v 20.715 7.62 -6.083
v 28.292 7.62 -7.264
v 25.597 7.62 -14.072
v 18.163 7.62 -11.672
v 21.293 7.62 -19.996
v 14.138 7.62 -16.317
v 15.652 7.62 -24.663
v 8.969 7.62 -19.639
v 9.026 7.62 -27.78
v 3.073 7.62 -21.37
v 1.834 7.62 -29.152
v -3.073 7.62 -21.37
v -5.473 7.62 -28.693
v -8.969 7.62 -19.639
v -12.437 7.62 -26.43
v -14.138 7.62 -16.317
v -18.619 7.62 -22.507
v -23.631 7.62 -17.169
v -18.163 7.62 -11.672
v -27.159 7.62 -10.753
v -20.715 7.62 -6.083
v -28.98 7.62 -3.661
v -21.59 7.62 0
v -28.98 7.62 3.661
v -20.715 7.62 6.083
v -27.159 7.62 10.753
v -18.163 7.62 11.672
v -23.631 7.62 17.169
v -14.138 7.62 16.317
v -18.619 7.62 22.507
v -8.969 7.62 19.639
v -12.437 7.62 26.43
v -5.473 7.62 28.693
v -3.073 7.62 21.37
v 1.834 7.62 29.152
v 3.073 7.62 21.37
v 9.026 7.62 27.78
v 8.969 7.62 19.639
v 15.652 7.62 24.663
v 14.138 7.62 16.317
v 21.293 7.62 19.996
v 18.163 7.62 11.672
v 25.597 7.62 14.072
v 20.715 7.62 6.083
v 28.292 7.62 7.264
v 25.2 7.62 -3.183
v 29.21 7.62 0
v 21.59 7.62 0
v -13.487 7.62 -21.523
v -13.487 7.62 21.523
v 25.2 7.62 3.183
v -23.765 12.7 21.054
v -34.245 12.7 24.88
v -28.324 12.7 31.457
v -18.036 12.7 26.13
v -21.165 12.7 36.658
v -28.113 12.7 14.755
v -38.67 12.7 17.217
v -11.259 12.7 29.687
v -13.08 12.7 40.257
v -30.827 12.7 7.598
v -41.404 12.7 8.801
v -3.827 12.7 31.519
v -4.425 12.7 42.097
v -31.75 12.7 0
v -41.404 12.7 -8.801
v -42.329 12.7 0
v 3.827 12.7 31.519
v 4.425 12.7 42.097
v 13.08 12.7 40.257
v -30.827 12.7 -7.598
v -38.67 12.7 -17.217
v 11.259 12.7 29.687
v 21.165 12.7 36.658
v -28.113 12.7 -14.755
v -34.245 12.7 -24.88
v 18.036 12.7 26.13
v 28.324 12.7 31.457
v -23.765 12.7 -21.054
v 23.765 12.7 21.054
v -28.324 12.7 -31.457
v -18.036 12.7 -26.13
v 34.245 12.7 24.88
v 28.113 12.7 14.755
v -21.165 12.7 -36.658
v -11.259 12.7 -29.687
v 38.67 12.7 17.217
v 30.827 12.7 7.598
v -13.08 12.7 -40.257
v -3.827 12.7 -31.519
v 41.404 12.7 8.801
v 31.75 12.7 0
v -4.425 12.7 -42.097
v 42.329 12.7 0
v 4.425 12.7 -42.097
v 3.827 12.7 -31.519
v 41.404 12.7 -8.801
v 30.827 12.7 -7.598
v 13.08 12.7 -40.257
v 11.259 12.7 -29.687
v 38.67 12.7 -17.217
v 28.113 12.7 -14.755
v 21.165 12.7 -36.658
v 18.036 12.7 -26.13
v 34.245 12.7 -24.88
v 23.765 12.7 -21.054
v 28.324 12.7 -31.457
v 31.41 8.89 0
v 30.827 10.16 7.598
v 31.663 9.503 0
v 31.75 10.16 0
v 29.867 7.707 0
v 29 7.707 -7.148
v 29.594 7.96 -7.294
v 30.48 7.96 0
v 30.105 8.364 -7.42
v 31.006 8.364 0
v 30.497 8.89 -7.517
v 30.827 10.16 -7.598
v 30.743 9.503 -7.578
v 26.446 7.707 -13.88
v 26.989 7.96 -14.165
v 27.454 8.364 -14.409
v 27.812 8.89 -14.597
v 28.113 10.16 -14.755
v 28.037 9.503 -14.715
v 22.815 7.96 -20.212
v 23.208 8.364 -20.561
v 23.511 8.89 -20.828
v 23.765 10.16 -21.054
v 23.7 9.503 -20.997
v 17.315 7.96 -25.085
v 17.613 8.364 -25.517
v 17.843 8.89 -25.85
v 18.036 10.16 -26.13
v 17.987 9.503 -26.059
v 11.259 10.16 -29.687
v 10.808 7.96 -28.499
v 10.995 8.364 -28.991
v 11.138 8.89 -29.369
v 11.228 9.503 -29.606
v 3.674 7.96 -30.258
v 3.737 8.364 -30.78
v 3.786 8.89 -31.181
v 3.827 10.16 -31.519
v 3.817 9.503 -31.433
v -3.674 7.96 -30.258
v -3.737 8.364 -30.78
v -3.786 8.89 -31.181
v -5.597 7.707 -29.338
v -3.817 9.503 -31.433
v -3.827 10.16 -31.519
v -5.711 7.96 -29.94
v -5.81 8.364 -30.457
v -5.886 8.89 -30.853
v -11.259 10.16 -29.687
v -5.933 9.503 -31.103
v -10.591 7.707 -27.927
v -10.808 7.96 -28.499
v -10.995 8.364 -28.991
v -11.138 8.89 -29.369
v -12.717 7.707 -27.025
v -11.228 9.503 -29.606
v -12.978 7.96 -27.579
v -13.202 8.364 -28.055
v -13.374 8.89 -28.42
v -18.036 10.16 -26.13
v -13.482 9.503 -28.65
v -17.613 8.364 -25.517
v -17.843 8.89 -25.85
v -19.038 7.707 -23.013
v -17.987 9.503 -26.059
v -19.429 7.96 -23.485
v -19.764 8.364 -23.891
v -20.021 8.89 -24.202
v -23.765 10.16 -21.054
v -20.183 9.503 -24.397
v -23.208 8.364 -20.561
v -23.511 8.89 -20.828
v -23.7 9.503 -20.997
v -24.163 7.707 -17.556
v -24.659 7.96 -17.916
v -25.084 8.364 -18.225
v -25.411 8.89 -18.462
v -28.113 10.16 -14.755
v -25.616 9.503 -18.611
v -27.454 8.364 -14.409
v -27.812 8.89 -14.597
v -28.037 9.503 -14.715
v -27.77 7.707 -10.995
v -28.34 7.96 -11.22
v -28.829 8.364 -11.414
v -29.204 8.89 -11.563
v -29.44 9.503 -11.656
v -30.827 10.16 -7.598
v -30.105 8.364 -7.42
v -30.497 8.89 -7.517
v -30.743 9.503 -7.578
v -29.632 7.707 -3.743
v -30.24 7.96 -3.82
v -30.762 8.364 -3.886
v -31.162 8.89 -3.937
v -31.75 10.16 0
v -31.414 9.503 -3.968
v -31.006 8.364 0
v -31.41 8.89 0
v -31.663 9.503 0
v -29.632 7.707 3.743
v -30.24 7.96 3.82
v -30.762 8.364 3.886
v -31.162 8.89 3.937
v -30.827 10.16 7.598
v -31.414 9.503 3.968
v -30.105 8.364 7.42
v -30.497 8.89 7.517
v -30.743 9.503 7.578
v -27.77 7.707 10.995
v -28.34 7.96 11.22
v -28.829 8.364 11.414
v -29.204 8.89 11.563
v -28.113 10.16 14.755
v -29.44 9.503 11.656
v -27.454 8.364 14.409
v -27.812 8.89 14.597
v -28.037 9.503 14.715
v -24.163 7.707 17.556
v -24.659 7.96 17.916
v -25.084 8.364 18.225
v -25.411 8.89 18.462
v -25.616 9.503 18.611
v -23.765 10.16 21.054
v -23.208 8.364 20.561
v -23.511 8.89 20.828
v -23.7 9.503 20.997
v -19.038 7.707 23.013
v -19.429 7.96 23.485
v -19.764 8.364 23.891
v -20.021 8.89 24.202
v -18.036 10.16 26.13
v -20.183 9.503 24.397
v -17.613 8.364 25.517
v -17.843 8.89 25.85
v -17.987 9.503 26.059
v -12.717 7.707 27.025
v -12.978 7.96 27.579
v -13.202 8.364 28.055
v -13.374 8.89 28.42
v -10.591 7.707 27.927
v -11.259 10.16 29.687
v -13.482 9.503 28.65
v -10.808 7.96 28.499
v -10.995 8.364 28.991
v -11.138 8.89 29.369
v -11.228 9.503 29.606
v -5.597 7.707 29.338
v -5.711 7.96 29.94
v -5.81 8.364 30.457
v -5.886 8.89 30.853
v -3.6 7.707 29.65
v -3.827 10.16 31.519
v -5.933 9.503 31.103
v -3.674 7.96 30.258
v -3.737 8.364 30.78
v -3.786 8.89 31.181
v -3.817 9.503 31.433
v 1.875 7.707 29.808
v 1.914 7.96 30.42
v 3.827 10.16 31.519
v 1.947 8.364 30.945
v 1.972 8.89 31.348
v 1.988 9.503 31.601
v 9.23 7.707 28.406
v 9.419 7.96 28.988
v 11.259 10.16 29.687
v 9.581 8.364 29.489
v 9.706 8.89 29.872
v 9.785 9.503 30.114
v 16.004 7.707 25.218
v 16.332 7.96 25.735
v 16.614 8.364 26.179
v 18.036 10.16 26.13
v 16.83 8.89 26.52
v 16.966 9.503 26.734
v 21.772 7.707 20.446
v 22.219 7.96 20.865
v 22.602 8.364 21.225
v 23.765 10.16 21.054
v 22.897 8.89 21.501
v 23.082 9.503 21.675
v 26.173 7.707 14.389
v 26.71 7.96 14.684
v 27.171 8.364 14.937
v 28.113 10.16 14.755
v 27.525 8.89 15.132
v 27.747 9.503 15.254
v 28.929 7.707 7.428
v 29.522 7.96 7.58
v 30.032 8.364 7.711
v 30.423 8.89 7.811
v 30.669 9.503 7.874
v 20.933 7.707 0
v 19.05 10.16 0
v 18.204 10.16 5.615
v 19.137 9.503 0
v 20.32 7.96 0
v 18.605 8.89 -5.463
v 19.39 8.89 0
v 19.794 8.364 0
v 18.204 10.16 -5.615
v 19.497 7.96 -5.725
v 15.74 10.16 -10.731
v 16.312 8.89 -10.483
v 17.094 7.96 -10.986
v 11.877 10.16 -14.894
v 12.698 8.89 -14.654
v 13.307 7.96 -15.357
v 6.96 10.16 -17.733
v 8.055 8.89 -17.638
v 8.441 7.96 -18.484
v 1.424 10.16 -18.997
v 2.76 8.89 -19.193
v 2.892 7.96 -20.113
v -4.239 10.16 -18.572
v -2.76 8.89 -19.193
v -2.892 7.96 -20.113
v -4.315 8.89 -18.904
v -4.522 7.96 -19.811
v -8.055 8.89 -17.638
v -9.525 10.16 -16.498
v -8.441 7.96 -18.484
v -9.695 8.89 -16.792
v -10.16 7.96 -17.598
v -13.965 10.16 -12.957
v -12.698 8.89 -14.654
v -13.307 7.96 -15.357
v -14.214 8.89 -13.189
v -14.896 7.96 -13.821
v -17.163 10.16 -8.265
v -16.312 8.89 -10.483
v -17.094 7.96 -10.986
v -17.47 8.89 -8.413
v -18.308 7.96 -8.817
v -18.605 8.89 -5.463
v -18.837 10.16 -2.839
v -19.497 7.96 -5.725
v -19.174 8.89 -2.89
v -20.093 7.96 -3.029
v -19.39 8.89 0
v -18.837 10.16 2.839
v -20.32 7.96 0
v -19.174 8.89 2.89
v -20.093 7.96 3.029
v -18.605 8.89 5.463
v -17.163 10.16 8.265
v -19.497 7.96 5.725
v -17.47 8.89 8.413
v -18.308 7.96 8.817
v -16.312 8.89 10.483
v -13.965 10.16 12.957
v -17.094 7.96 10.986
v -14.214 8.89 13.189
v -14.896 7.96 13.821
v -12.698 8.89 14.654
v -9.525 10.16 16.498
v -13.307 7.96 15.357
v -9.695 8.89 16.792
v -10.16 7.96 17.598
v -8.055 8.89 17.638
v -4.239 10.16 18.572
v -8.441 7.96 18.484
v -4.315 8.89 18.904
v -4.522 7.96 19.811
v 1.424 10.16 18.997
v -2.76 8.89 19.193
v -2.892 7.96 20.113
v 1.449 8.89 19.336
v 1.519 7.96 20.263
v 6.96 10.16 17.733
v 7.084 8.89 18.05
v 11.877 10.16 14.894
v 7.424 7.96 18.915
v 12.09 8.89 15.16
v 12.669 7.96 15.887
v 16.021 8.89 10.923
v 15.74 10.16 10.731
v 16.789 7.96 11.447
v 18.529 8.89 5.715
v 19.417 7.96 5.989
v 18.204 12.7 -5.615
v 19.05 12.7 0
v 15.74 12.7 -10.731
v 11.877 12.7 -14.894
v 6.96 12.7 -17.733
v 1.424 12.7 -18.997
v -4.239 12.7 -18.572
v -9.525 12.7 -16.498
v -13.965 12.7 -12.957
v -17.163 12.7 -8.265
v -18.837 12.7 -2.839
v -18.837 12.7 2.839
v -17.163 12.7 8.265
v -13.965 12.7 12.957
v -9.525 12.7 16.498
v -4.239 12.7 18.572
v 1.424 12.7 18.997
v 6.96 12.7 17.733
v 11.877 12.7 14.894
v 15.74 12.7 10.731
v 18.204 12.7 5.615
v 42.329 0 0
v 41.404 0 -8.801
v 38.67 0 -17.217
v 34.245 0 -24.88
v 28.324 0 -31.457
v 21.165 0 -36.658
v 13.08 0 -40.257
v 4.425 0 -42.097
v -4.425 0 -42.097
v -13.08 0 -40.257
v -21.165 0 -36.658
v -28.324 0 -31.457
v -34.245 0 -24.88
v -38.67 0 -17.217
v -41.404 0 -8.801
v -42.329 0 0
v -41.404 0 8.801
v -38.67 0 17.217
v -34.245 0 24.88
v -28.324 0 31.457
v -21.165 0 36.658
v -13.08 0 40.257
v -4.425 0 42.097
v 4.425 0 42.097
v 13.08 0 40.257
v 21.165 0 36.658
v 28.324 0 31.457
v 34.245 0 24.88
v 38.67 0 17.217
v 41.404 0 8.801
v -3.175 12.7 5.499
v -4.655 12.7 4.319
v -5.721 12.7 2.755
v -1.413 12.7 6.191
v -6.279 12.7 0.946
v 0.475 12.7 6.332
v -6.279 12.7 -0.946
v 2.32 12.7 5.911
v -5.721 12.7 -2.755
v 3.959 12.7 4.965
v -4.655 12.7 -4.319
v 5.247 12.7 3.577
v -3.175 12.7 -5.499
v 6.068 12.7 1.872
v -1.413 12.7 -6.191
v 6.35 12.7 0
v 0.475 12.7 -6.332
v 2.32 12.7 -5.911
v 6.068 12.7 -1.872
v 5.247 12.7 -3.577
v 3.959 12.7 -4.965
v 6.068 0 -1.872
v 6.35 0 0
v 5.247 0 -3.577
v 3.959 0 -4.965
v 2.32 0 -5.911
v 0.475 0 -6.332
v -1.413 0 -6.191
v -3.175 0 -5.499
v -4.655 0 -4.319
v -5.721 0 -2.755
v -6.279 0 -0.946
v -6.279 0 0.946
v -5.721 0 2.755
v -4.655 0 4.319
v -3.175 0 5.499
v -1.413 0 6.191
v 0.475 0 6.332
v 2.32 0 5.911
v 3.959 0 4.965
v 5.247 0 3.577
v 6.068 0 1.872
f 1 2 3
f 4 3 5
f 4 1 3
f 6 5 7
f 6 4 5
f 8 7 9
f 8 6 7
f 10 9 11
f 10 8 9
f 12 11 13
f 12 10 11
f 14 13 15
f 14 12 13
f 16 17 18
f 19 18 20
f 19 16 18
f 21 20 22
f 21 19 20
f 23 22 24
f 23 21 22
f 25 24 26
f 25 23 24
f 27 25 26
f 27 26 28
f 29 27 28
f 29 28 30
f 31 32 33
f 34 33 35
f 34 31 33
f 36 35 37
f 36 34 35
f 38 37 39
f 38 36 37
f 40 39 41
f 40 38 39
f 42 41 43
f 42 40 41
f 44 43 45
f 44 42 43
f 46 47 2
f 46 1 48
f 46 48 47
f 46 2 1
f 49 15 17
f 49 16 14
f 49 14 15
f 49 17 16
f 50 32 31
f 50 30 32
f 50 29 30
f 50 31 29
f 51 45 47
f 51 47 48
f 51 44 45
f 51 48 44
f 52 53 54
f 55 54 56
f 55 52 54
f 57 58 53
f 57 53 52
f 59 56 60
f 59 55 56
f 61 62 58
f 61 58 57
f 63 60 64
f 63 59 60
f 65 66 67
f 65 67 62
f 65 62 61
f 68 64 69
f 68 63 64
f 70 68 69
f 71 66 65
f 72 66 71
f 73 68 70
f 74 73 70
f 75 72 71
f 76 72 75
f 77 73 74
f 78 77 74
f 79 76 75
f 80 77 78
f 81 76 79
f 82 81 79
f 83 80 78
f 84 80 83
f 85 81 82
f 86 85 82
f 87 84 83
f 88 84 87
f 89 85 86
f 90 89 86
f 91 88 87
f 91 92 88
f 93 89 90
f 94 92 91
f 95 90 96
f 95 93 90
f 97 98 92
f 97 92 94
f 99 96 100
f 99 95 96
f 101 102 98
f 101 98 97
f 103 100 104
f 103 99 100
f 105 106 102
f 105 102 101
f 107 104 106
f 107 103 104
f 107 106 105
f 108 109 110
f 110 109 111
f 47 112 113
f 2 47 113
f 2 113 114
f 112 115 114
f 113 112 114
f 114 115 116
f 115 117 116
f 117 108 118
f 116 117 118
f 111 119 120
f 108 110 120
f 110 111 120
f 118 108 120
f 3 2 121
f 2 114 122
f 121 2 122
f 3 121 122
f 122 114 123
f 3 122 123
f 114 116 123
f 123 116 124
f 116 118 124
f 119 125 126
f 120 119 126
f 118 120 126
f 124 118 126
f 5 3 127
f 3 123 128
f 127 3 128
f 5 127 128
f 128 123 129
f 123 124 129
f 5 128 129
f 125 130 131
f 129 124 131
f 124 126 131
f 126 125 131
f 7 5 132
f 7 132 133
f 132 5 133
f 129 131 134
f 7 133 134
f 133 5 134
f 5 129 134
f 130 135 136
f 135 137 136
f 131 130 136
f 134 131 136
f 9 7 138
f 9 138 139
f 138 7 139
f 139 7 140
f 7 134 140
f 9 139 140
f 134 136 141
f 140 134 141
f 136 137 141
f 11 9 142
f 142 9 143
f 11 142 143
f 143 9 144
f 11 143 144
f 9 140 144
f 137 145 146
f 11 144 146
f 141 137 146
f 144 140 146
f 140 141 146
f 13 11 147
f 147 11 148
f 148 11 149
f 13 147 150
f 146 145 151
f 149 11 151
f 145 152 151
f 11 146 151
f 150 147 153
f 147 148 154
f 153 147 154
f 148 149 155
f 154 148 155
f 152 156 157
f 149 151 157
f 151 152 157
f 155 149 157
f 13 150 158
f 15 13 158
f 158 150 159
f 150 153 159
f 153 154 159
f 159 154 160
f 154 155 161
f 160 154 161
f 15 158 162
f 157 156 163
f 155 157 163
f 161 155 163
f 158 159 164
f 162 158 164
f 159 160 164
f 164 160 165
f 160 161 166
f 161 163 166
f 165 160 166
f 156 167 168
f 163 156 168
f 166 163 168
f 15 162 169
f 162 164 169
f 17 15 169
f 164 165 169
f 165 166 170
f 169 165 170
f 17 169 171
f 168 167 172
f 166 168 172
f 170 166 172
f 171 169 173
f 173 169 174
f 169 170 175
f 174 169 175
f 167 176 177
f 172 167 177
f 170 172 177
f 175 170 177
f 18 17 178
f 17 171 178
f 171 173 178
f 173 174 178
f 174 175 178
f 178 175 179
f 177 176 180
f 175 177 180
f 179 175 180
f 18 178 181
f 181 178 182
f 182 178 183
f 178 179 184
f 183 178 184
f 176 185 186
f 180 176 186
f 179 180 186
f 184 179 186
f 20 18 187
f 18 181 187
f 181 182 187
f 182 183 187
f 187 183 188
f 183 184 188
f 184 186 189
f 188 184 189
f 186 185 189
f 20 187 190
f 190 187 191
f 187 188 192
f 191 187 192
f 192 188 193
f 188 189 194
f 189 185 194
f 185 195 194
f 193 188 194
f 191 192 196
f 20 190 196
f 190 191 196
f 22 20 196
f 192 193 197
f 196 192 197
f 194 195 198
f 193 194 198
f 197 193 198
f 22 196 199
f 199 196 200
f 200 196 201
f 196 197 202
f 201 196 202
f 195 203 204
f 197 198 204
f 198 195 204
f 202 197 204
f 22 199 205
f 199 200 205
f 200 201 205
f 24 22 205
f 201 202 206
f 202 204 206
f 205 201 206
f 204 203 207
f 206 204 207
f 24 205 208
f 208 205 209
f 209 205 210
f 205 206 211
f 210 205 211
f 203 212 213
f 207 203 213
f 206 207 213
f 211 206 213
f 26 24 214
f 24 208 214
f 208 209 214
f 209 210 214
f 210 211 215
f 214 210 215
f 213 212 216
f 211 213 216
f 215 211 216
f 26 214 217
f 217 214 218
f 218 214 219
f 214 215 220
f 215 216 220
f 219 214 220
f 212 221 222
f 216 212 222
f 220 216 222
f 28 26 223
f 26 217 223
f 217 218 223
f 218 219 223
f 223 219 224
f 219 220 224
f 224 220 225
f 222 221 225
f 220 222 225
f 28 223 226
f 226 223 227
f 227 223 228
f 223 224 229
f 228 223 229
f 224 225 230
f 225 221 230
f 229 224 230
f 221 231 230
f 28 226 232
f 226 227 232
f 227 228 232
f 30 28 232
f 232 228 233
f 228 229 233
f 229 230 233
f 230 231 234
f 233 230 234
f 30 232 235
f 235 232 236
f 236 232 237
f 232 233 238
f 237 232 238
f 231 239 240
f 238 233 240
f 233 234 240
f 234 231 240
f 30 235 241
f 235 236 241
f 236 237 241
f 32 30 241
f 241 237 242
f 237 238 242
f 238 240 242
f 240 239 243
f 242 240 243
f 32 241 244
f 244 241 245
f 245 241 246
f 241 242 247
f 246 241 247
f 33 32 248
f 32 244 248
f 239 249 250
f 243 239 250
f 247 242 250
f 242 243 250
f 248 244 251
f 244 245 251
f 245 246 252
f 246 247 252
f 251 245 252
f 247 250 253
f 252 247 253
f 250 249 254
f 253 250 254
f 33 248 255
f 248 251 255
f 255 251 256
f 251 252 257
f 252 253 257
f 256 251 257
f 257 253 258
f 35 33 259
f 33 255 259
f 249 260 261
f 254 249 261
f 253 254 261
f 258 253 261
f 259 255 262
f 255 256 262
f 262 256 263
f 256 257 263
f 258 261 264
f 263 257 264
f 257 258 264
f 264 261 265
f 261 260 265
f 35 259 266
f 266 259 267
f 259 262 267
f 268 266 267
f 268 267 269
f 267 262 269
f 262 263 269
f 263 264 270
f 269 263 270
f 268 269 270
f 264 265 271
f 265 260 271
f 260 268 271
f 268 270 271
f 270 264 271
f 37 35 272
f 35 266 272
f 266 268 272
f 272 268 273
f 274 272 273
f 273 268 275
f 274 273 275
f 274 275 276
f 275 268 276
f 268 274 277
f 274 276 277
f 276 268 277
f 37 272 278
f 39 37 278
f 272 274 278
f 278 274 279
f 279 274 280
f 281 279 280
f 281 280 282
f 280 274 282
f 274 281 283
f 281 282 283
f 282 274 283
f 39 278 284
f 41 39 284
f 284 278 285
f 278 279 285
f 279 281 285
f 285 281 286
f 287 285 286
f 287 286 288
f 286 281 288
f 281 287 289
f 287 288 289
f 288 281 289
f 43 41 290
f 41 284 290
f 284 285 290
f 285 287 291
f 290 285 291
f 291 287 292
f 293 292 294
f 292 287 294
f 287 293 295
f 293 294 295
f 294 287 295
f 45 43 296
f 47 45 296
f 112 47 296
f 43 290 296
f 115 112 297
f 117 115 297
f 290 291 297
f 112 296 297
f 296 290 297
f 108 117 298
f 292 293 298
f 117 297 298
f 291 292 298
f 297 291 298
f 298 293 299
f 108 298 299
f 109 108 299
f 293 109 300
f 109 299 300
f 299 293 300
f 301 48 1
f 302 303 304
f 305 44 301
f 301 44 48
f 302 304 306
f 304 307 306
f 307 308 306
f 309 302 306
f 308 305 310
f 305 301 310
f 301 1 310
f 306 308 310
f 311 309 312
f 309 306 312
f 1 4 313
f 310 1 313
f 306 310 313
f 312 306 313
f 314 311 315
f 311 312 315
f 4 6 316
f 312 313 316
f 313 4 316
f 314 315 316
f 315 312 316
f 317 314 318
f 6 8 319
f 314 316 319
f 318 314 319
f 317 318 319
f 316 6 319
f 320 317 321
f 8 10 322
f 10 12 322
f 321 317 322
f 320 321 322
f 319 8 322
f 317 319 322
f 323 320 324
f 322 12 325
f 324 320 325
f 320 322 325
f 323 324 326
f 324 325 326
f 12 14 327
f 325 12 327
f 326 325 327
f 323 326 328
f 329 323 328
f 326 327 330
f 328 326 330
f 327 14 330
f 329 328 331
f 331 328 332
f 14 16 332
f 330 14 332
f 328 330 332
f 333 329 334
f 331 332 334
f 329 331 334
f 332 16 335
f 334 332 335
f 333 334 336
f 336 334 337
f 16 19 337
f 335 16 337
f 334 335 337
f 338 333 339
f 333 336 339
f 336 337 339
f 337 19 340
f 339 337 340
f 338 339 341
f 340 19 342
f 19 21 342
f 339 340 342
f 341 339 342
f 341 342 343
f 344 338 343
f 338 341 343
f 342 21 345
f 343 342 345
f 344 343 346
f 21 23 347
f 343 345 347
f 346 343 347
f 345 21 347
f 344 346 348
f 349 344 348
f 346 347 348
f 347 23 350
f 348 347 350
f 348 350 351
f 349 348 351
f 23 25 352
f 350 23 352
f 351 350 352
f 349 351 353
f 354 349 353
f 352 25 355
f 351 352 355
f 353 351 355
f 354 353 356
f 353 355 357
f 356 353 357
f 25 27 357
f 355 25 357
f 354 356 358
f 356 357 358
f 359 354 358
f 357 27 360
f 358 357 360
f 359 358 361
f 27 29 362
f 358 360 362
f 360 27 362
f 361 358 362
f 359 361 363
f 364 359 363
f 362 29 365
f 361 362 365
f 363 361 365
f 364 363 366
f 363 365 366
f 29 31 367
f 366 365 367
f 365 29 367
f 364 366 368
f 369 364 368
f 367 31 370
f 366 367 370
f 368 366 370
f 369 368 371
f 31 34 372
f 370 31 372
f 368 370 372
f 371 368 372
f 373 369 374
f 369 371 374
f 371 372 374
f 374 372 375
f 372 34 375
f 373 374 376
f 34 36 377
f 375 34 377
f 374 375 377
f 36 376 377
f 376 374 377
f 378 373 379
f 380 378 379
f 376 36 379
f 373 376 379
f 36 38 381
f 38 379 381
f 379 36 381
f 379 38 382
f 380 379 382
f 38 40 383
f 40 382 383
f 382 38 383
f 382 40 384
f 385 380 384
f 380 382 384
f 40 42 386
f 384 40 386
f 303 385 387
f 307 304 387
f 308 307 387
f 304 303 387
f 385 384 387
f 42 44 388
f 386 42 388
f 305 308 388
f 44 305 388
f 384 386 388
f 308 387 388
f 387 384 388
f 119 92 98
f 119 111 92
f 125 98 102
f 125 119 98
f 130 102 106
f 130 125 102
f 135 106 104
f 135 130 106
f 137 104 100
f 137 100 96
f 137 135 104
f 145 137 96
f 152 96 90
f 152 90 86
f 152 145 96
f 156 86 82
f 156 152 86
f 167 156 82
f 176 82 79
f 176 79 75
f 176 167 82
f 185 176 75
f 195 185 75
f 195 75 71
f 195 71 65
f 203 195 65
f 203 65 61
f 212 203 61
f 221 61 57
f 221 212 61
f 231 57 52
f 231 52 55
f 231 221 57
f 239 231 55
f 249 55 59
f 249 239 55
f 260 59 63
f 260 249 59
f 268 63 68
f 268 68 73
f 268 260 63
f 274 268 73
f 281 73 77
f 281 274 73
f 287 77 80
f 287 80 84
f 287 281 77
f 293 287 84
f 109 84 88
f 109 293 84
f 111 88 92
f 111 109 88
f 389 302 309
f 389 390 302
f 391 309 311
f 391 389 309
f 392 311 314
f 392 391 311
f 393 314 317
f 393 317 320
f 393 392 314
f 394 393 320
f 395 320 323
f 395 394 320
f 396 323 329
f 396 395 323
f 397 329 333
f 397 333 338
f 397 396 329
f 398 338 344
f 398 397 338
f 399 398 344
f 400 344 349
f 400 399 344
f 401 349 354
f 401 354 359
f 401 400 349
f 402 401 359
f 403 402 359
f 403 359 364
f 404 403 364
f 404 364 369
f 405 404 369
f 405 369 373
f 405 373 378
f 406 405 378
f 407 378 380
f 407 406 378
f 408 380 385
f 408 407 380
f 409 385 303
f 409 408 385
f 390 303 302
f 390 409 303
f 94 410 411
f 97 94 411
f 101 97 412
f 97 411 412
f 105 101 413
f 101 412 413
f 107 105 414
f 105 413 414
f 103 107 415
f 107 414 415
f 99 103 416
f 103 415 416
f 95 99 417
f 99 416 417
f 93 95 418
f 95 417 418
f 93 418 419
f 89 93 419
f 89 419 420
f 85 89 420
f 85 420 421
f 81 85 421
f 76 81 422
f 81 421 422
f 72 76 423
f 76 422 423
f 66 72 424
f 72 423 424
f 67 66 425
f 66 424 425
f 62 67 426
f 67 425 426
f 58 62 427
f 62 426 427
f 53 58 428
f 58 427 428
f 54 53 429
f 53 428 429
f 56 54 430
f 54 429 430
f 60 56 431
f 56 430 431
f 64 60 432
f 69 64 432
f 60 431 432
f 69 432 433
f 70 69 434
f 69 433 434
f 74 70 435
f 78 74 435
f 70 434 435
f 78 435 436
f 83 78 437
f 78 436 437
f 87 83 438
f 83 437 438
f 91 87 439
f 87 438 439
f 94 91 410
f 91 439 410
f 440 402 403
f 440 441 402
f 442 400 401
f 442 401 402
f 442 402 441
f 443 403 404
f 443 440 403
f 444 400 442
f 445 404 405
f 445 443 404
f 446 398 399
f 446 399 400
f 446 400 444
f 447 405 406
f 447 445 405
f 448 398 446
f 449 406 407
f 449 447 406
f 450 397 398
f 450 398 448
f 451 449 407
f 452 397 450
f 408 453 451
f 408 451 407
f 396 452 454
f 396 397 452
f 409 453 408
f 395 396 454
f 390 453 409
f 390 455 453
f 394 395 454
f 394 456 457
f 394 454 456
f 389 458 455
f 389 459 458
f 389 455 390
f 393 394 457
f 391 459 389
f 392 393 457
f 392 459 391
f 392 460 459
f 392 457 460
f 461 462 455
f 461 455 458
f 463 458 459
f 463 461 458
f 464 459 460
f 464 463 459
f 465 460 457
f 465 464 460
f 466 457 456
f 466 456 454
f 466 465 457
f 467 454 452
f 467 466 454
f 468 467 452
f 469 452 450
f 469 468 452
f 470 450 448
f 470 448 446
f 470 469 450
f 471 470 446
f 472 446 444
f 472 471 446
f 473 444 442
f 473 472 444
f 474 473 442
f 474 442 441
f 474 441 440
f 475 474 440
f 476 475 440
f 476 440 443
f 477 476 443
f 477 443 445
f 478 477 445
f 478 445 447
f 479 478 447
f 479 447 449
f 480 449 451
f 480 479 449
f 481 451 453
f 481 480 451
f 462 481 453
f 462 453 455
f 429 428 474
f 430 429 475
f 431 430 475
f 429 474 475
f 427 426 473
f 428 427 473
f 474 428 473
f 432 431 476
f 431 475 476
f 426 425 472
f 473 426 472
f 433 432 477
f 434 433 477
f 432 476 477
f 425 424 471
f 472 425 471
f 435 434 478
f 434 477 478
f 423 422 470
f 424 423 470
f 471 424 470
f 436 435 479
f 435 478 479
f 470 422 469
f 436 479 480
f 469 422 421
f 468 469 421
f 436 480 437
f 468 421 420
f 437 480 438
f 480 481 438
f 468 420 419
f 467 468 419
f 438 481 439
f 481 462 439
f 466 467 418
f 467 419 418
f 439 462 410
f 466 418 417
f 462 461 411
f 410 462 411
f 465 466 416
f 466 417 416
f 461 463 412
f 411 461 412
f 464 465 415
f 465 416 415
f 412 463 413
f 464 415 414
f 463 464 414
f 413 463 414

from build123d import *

# Parameters (mm, degrees)
SKETCH1_R           = 42.3291
SKETCH1_R_2         = 6.35
BOSS_EXTRUDE1_DEPTH = 12.7


with BuildPart() as part:
    # Sketch1 → Boss-Extrude1 (new body)
    with BuildSketch(Plane(origin=(0, 0, 0), x_dir=(1, 0, 0), z_dir=(0, 1, 0))):
        Circle(SKETCH1_R)
        Circle(SKETCH1_R_2, mode=Mode.SUBTRACT)
    extrude(amount=BOSS_EXTRUDE1_DEPTH)

    # Cut-Sweep5: sweep along a path in Sketch3
    with BuildLine(Plane(origin=(0, 12.7, 0), x_dir=(1, 0, 0), z_dir=(0, 1, 0))) as cut_sweep5_path:
        CenterArc((0, 0), 25.4, 0, 360)
    # Sketch4 → Cut-Sweep5 (sweep, cut)
    with BuildSketch(Plane.XY):
        with BuildLine():
            Line((-31.75, 12.7), (-19.05, 12.7))
            Line((-19.05, 12.7), (-19.05, 10.16))
            ThreePointArc((-19.05, 10.16), (-19.793948776, 8.363948776), (-21.59, 7.62))
            Line((-21.59, 7.62), (-29.21, 7.62))
            ThreePointArc((-29.21, 7.62), (-31.006051224, 8.363948776), (-31.75, 10.16))
            Line((-31.75, 10.16), (-31.75, 12.7))
        make_face()
    sweep(path=cut_sweep5_path.line, mode=Mode.SUBTRACT)


solid = part.part
